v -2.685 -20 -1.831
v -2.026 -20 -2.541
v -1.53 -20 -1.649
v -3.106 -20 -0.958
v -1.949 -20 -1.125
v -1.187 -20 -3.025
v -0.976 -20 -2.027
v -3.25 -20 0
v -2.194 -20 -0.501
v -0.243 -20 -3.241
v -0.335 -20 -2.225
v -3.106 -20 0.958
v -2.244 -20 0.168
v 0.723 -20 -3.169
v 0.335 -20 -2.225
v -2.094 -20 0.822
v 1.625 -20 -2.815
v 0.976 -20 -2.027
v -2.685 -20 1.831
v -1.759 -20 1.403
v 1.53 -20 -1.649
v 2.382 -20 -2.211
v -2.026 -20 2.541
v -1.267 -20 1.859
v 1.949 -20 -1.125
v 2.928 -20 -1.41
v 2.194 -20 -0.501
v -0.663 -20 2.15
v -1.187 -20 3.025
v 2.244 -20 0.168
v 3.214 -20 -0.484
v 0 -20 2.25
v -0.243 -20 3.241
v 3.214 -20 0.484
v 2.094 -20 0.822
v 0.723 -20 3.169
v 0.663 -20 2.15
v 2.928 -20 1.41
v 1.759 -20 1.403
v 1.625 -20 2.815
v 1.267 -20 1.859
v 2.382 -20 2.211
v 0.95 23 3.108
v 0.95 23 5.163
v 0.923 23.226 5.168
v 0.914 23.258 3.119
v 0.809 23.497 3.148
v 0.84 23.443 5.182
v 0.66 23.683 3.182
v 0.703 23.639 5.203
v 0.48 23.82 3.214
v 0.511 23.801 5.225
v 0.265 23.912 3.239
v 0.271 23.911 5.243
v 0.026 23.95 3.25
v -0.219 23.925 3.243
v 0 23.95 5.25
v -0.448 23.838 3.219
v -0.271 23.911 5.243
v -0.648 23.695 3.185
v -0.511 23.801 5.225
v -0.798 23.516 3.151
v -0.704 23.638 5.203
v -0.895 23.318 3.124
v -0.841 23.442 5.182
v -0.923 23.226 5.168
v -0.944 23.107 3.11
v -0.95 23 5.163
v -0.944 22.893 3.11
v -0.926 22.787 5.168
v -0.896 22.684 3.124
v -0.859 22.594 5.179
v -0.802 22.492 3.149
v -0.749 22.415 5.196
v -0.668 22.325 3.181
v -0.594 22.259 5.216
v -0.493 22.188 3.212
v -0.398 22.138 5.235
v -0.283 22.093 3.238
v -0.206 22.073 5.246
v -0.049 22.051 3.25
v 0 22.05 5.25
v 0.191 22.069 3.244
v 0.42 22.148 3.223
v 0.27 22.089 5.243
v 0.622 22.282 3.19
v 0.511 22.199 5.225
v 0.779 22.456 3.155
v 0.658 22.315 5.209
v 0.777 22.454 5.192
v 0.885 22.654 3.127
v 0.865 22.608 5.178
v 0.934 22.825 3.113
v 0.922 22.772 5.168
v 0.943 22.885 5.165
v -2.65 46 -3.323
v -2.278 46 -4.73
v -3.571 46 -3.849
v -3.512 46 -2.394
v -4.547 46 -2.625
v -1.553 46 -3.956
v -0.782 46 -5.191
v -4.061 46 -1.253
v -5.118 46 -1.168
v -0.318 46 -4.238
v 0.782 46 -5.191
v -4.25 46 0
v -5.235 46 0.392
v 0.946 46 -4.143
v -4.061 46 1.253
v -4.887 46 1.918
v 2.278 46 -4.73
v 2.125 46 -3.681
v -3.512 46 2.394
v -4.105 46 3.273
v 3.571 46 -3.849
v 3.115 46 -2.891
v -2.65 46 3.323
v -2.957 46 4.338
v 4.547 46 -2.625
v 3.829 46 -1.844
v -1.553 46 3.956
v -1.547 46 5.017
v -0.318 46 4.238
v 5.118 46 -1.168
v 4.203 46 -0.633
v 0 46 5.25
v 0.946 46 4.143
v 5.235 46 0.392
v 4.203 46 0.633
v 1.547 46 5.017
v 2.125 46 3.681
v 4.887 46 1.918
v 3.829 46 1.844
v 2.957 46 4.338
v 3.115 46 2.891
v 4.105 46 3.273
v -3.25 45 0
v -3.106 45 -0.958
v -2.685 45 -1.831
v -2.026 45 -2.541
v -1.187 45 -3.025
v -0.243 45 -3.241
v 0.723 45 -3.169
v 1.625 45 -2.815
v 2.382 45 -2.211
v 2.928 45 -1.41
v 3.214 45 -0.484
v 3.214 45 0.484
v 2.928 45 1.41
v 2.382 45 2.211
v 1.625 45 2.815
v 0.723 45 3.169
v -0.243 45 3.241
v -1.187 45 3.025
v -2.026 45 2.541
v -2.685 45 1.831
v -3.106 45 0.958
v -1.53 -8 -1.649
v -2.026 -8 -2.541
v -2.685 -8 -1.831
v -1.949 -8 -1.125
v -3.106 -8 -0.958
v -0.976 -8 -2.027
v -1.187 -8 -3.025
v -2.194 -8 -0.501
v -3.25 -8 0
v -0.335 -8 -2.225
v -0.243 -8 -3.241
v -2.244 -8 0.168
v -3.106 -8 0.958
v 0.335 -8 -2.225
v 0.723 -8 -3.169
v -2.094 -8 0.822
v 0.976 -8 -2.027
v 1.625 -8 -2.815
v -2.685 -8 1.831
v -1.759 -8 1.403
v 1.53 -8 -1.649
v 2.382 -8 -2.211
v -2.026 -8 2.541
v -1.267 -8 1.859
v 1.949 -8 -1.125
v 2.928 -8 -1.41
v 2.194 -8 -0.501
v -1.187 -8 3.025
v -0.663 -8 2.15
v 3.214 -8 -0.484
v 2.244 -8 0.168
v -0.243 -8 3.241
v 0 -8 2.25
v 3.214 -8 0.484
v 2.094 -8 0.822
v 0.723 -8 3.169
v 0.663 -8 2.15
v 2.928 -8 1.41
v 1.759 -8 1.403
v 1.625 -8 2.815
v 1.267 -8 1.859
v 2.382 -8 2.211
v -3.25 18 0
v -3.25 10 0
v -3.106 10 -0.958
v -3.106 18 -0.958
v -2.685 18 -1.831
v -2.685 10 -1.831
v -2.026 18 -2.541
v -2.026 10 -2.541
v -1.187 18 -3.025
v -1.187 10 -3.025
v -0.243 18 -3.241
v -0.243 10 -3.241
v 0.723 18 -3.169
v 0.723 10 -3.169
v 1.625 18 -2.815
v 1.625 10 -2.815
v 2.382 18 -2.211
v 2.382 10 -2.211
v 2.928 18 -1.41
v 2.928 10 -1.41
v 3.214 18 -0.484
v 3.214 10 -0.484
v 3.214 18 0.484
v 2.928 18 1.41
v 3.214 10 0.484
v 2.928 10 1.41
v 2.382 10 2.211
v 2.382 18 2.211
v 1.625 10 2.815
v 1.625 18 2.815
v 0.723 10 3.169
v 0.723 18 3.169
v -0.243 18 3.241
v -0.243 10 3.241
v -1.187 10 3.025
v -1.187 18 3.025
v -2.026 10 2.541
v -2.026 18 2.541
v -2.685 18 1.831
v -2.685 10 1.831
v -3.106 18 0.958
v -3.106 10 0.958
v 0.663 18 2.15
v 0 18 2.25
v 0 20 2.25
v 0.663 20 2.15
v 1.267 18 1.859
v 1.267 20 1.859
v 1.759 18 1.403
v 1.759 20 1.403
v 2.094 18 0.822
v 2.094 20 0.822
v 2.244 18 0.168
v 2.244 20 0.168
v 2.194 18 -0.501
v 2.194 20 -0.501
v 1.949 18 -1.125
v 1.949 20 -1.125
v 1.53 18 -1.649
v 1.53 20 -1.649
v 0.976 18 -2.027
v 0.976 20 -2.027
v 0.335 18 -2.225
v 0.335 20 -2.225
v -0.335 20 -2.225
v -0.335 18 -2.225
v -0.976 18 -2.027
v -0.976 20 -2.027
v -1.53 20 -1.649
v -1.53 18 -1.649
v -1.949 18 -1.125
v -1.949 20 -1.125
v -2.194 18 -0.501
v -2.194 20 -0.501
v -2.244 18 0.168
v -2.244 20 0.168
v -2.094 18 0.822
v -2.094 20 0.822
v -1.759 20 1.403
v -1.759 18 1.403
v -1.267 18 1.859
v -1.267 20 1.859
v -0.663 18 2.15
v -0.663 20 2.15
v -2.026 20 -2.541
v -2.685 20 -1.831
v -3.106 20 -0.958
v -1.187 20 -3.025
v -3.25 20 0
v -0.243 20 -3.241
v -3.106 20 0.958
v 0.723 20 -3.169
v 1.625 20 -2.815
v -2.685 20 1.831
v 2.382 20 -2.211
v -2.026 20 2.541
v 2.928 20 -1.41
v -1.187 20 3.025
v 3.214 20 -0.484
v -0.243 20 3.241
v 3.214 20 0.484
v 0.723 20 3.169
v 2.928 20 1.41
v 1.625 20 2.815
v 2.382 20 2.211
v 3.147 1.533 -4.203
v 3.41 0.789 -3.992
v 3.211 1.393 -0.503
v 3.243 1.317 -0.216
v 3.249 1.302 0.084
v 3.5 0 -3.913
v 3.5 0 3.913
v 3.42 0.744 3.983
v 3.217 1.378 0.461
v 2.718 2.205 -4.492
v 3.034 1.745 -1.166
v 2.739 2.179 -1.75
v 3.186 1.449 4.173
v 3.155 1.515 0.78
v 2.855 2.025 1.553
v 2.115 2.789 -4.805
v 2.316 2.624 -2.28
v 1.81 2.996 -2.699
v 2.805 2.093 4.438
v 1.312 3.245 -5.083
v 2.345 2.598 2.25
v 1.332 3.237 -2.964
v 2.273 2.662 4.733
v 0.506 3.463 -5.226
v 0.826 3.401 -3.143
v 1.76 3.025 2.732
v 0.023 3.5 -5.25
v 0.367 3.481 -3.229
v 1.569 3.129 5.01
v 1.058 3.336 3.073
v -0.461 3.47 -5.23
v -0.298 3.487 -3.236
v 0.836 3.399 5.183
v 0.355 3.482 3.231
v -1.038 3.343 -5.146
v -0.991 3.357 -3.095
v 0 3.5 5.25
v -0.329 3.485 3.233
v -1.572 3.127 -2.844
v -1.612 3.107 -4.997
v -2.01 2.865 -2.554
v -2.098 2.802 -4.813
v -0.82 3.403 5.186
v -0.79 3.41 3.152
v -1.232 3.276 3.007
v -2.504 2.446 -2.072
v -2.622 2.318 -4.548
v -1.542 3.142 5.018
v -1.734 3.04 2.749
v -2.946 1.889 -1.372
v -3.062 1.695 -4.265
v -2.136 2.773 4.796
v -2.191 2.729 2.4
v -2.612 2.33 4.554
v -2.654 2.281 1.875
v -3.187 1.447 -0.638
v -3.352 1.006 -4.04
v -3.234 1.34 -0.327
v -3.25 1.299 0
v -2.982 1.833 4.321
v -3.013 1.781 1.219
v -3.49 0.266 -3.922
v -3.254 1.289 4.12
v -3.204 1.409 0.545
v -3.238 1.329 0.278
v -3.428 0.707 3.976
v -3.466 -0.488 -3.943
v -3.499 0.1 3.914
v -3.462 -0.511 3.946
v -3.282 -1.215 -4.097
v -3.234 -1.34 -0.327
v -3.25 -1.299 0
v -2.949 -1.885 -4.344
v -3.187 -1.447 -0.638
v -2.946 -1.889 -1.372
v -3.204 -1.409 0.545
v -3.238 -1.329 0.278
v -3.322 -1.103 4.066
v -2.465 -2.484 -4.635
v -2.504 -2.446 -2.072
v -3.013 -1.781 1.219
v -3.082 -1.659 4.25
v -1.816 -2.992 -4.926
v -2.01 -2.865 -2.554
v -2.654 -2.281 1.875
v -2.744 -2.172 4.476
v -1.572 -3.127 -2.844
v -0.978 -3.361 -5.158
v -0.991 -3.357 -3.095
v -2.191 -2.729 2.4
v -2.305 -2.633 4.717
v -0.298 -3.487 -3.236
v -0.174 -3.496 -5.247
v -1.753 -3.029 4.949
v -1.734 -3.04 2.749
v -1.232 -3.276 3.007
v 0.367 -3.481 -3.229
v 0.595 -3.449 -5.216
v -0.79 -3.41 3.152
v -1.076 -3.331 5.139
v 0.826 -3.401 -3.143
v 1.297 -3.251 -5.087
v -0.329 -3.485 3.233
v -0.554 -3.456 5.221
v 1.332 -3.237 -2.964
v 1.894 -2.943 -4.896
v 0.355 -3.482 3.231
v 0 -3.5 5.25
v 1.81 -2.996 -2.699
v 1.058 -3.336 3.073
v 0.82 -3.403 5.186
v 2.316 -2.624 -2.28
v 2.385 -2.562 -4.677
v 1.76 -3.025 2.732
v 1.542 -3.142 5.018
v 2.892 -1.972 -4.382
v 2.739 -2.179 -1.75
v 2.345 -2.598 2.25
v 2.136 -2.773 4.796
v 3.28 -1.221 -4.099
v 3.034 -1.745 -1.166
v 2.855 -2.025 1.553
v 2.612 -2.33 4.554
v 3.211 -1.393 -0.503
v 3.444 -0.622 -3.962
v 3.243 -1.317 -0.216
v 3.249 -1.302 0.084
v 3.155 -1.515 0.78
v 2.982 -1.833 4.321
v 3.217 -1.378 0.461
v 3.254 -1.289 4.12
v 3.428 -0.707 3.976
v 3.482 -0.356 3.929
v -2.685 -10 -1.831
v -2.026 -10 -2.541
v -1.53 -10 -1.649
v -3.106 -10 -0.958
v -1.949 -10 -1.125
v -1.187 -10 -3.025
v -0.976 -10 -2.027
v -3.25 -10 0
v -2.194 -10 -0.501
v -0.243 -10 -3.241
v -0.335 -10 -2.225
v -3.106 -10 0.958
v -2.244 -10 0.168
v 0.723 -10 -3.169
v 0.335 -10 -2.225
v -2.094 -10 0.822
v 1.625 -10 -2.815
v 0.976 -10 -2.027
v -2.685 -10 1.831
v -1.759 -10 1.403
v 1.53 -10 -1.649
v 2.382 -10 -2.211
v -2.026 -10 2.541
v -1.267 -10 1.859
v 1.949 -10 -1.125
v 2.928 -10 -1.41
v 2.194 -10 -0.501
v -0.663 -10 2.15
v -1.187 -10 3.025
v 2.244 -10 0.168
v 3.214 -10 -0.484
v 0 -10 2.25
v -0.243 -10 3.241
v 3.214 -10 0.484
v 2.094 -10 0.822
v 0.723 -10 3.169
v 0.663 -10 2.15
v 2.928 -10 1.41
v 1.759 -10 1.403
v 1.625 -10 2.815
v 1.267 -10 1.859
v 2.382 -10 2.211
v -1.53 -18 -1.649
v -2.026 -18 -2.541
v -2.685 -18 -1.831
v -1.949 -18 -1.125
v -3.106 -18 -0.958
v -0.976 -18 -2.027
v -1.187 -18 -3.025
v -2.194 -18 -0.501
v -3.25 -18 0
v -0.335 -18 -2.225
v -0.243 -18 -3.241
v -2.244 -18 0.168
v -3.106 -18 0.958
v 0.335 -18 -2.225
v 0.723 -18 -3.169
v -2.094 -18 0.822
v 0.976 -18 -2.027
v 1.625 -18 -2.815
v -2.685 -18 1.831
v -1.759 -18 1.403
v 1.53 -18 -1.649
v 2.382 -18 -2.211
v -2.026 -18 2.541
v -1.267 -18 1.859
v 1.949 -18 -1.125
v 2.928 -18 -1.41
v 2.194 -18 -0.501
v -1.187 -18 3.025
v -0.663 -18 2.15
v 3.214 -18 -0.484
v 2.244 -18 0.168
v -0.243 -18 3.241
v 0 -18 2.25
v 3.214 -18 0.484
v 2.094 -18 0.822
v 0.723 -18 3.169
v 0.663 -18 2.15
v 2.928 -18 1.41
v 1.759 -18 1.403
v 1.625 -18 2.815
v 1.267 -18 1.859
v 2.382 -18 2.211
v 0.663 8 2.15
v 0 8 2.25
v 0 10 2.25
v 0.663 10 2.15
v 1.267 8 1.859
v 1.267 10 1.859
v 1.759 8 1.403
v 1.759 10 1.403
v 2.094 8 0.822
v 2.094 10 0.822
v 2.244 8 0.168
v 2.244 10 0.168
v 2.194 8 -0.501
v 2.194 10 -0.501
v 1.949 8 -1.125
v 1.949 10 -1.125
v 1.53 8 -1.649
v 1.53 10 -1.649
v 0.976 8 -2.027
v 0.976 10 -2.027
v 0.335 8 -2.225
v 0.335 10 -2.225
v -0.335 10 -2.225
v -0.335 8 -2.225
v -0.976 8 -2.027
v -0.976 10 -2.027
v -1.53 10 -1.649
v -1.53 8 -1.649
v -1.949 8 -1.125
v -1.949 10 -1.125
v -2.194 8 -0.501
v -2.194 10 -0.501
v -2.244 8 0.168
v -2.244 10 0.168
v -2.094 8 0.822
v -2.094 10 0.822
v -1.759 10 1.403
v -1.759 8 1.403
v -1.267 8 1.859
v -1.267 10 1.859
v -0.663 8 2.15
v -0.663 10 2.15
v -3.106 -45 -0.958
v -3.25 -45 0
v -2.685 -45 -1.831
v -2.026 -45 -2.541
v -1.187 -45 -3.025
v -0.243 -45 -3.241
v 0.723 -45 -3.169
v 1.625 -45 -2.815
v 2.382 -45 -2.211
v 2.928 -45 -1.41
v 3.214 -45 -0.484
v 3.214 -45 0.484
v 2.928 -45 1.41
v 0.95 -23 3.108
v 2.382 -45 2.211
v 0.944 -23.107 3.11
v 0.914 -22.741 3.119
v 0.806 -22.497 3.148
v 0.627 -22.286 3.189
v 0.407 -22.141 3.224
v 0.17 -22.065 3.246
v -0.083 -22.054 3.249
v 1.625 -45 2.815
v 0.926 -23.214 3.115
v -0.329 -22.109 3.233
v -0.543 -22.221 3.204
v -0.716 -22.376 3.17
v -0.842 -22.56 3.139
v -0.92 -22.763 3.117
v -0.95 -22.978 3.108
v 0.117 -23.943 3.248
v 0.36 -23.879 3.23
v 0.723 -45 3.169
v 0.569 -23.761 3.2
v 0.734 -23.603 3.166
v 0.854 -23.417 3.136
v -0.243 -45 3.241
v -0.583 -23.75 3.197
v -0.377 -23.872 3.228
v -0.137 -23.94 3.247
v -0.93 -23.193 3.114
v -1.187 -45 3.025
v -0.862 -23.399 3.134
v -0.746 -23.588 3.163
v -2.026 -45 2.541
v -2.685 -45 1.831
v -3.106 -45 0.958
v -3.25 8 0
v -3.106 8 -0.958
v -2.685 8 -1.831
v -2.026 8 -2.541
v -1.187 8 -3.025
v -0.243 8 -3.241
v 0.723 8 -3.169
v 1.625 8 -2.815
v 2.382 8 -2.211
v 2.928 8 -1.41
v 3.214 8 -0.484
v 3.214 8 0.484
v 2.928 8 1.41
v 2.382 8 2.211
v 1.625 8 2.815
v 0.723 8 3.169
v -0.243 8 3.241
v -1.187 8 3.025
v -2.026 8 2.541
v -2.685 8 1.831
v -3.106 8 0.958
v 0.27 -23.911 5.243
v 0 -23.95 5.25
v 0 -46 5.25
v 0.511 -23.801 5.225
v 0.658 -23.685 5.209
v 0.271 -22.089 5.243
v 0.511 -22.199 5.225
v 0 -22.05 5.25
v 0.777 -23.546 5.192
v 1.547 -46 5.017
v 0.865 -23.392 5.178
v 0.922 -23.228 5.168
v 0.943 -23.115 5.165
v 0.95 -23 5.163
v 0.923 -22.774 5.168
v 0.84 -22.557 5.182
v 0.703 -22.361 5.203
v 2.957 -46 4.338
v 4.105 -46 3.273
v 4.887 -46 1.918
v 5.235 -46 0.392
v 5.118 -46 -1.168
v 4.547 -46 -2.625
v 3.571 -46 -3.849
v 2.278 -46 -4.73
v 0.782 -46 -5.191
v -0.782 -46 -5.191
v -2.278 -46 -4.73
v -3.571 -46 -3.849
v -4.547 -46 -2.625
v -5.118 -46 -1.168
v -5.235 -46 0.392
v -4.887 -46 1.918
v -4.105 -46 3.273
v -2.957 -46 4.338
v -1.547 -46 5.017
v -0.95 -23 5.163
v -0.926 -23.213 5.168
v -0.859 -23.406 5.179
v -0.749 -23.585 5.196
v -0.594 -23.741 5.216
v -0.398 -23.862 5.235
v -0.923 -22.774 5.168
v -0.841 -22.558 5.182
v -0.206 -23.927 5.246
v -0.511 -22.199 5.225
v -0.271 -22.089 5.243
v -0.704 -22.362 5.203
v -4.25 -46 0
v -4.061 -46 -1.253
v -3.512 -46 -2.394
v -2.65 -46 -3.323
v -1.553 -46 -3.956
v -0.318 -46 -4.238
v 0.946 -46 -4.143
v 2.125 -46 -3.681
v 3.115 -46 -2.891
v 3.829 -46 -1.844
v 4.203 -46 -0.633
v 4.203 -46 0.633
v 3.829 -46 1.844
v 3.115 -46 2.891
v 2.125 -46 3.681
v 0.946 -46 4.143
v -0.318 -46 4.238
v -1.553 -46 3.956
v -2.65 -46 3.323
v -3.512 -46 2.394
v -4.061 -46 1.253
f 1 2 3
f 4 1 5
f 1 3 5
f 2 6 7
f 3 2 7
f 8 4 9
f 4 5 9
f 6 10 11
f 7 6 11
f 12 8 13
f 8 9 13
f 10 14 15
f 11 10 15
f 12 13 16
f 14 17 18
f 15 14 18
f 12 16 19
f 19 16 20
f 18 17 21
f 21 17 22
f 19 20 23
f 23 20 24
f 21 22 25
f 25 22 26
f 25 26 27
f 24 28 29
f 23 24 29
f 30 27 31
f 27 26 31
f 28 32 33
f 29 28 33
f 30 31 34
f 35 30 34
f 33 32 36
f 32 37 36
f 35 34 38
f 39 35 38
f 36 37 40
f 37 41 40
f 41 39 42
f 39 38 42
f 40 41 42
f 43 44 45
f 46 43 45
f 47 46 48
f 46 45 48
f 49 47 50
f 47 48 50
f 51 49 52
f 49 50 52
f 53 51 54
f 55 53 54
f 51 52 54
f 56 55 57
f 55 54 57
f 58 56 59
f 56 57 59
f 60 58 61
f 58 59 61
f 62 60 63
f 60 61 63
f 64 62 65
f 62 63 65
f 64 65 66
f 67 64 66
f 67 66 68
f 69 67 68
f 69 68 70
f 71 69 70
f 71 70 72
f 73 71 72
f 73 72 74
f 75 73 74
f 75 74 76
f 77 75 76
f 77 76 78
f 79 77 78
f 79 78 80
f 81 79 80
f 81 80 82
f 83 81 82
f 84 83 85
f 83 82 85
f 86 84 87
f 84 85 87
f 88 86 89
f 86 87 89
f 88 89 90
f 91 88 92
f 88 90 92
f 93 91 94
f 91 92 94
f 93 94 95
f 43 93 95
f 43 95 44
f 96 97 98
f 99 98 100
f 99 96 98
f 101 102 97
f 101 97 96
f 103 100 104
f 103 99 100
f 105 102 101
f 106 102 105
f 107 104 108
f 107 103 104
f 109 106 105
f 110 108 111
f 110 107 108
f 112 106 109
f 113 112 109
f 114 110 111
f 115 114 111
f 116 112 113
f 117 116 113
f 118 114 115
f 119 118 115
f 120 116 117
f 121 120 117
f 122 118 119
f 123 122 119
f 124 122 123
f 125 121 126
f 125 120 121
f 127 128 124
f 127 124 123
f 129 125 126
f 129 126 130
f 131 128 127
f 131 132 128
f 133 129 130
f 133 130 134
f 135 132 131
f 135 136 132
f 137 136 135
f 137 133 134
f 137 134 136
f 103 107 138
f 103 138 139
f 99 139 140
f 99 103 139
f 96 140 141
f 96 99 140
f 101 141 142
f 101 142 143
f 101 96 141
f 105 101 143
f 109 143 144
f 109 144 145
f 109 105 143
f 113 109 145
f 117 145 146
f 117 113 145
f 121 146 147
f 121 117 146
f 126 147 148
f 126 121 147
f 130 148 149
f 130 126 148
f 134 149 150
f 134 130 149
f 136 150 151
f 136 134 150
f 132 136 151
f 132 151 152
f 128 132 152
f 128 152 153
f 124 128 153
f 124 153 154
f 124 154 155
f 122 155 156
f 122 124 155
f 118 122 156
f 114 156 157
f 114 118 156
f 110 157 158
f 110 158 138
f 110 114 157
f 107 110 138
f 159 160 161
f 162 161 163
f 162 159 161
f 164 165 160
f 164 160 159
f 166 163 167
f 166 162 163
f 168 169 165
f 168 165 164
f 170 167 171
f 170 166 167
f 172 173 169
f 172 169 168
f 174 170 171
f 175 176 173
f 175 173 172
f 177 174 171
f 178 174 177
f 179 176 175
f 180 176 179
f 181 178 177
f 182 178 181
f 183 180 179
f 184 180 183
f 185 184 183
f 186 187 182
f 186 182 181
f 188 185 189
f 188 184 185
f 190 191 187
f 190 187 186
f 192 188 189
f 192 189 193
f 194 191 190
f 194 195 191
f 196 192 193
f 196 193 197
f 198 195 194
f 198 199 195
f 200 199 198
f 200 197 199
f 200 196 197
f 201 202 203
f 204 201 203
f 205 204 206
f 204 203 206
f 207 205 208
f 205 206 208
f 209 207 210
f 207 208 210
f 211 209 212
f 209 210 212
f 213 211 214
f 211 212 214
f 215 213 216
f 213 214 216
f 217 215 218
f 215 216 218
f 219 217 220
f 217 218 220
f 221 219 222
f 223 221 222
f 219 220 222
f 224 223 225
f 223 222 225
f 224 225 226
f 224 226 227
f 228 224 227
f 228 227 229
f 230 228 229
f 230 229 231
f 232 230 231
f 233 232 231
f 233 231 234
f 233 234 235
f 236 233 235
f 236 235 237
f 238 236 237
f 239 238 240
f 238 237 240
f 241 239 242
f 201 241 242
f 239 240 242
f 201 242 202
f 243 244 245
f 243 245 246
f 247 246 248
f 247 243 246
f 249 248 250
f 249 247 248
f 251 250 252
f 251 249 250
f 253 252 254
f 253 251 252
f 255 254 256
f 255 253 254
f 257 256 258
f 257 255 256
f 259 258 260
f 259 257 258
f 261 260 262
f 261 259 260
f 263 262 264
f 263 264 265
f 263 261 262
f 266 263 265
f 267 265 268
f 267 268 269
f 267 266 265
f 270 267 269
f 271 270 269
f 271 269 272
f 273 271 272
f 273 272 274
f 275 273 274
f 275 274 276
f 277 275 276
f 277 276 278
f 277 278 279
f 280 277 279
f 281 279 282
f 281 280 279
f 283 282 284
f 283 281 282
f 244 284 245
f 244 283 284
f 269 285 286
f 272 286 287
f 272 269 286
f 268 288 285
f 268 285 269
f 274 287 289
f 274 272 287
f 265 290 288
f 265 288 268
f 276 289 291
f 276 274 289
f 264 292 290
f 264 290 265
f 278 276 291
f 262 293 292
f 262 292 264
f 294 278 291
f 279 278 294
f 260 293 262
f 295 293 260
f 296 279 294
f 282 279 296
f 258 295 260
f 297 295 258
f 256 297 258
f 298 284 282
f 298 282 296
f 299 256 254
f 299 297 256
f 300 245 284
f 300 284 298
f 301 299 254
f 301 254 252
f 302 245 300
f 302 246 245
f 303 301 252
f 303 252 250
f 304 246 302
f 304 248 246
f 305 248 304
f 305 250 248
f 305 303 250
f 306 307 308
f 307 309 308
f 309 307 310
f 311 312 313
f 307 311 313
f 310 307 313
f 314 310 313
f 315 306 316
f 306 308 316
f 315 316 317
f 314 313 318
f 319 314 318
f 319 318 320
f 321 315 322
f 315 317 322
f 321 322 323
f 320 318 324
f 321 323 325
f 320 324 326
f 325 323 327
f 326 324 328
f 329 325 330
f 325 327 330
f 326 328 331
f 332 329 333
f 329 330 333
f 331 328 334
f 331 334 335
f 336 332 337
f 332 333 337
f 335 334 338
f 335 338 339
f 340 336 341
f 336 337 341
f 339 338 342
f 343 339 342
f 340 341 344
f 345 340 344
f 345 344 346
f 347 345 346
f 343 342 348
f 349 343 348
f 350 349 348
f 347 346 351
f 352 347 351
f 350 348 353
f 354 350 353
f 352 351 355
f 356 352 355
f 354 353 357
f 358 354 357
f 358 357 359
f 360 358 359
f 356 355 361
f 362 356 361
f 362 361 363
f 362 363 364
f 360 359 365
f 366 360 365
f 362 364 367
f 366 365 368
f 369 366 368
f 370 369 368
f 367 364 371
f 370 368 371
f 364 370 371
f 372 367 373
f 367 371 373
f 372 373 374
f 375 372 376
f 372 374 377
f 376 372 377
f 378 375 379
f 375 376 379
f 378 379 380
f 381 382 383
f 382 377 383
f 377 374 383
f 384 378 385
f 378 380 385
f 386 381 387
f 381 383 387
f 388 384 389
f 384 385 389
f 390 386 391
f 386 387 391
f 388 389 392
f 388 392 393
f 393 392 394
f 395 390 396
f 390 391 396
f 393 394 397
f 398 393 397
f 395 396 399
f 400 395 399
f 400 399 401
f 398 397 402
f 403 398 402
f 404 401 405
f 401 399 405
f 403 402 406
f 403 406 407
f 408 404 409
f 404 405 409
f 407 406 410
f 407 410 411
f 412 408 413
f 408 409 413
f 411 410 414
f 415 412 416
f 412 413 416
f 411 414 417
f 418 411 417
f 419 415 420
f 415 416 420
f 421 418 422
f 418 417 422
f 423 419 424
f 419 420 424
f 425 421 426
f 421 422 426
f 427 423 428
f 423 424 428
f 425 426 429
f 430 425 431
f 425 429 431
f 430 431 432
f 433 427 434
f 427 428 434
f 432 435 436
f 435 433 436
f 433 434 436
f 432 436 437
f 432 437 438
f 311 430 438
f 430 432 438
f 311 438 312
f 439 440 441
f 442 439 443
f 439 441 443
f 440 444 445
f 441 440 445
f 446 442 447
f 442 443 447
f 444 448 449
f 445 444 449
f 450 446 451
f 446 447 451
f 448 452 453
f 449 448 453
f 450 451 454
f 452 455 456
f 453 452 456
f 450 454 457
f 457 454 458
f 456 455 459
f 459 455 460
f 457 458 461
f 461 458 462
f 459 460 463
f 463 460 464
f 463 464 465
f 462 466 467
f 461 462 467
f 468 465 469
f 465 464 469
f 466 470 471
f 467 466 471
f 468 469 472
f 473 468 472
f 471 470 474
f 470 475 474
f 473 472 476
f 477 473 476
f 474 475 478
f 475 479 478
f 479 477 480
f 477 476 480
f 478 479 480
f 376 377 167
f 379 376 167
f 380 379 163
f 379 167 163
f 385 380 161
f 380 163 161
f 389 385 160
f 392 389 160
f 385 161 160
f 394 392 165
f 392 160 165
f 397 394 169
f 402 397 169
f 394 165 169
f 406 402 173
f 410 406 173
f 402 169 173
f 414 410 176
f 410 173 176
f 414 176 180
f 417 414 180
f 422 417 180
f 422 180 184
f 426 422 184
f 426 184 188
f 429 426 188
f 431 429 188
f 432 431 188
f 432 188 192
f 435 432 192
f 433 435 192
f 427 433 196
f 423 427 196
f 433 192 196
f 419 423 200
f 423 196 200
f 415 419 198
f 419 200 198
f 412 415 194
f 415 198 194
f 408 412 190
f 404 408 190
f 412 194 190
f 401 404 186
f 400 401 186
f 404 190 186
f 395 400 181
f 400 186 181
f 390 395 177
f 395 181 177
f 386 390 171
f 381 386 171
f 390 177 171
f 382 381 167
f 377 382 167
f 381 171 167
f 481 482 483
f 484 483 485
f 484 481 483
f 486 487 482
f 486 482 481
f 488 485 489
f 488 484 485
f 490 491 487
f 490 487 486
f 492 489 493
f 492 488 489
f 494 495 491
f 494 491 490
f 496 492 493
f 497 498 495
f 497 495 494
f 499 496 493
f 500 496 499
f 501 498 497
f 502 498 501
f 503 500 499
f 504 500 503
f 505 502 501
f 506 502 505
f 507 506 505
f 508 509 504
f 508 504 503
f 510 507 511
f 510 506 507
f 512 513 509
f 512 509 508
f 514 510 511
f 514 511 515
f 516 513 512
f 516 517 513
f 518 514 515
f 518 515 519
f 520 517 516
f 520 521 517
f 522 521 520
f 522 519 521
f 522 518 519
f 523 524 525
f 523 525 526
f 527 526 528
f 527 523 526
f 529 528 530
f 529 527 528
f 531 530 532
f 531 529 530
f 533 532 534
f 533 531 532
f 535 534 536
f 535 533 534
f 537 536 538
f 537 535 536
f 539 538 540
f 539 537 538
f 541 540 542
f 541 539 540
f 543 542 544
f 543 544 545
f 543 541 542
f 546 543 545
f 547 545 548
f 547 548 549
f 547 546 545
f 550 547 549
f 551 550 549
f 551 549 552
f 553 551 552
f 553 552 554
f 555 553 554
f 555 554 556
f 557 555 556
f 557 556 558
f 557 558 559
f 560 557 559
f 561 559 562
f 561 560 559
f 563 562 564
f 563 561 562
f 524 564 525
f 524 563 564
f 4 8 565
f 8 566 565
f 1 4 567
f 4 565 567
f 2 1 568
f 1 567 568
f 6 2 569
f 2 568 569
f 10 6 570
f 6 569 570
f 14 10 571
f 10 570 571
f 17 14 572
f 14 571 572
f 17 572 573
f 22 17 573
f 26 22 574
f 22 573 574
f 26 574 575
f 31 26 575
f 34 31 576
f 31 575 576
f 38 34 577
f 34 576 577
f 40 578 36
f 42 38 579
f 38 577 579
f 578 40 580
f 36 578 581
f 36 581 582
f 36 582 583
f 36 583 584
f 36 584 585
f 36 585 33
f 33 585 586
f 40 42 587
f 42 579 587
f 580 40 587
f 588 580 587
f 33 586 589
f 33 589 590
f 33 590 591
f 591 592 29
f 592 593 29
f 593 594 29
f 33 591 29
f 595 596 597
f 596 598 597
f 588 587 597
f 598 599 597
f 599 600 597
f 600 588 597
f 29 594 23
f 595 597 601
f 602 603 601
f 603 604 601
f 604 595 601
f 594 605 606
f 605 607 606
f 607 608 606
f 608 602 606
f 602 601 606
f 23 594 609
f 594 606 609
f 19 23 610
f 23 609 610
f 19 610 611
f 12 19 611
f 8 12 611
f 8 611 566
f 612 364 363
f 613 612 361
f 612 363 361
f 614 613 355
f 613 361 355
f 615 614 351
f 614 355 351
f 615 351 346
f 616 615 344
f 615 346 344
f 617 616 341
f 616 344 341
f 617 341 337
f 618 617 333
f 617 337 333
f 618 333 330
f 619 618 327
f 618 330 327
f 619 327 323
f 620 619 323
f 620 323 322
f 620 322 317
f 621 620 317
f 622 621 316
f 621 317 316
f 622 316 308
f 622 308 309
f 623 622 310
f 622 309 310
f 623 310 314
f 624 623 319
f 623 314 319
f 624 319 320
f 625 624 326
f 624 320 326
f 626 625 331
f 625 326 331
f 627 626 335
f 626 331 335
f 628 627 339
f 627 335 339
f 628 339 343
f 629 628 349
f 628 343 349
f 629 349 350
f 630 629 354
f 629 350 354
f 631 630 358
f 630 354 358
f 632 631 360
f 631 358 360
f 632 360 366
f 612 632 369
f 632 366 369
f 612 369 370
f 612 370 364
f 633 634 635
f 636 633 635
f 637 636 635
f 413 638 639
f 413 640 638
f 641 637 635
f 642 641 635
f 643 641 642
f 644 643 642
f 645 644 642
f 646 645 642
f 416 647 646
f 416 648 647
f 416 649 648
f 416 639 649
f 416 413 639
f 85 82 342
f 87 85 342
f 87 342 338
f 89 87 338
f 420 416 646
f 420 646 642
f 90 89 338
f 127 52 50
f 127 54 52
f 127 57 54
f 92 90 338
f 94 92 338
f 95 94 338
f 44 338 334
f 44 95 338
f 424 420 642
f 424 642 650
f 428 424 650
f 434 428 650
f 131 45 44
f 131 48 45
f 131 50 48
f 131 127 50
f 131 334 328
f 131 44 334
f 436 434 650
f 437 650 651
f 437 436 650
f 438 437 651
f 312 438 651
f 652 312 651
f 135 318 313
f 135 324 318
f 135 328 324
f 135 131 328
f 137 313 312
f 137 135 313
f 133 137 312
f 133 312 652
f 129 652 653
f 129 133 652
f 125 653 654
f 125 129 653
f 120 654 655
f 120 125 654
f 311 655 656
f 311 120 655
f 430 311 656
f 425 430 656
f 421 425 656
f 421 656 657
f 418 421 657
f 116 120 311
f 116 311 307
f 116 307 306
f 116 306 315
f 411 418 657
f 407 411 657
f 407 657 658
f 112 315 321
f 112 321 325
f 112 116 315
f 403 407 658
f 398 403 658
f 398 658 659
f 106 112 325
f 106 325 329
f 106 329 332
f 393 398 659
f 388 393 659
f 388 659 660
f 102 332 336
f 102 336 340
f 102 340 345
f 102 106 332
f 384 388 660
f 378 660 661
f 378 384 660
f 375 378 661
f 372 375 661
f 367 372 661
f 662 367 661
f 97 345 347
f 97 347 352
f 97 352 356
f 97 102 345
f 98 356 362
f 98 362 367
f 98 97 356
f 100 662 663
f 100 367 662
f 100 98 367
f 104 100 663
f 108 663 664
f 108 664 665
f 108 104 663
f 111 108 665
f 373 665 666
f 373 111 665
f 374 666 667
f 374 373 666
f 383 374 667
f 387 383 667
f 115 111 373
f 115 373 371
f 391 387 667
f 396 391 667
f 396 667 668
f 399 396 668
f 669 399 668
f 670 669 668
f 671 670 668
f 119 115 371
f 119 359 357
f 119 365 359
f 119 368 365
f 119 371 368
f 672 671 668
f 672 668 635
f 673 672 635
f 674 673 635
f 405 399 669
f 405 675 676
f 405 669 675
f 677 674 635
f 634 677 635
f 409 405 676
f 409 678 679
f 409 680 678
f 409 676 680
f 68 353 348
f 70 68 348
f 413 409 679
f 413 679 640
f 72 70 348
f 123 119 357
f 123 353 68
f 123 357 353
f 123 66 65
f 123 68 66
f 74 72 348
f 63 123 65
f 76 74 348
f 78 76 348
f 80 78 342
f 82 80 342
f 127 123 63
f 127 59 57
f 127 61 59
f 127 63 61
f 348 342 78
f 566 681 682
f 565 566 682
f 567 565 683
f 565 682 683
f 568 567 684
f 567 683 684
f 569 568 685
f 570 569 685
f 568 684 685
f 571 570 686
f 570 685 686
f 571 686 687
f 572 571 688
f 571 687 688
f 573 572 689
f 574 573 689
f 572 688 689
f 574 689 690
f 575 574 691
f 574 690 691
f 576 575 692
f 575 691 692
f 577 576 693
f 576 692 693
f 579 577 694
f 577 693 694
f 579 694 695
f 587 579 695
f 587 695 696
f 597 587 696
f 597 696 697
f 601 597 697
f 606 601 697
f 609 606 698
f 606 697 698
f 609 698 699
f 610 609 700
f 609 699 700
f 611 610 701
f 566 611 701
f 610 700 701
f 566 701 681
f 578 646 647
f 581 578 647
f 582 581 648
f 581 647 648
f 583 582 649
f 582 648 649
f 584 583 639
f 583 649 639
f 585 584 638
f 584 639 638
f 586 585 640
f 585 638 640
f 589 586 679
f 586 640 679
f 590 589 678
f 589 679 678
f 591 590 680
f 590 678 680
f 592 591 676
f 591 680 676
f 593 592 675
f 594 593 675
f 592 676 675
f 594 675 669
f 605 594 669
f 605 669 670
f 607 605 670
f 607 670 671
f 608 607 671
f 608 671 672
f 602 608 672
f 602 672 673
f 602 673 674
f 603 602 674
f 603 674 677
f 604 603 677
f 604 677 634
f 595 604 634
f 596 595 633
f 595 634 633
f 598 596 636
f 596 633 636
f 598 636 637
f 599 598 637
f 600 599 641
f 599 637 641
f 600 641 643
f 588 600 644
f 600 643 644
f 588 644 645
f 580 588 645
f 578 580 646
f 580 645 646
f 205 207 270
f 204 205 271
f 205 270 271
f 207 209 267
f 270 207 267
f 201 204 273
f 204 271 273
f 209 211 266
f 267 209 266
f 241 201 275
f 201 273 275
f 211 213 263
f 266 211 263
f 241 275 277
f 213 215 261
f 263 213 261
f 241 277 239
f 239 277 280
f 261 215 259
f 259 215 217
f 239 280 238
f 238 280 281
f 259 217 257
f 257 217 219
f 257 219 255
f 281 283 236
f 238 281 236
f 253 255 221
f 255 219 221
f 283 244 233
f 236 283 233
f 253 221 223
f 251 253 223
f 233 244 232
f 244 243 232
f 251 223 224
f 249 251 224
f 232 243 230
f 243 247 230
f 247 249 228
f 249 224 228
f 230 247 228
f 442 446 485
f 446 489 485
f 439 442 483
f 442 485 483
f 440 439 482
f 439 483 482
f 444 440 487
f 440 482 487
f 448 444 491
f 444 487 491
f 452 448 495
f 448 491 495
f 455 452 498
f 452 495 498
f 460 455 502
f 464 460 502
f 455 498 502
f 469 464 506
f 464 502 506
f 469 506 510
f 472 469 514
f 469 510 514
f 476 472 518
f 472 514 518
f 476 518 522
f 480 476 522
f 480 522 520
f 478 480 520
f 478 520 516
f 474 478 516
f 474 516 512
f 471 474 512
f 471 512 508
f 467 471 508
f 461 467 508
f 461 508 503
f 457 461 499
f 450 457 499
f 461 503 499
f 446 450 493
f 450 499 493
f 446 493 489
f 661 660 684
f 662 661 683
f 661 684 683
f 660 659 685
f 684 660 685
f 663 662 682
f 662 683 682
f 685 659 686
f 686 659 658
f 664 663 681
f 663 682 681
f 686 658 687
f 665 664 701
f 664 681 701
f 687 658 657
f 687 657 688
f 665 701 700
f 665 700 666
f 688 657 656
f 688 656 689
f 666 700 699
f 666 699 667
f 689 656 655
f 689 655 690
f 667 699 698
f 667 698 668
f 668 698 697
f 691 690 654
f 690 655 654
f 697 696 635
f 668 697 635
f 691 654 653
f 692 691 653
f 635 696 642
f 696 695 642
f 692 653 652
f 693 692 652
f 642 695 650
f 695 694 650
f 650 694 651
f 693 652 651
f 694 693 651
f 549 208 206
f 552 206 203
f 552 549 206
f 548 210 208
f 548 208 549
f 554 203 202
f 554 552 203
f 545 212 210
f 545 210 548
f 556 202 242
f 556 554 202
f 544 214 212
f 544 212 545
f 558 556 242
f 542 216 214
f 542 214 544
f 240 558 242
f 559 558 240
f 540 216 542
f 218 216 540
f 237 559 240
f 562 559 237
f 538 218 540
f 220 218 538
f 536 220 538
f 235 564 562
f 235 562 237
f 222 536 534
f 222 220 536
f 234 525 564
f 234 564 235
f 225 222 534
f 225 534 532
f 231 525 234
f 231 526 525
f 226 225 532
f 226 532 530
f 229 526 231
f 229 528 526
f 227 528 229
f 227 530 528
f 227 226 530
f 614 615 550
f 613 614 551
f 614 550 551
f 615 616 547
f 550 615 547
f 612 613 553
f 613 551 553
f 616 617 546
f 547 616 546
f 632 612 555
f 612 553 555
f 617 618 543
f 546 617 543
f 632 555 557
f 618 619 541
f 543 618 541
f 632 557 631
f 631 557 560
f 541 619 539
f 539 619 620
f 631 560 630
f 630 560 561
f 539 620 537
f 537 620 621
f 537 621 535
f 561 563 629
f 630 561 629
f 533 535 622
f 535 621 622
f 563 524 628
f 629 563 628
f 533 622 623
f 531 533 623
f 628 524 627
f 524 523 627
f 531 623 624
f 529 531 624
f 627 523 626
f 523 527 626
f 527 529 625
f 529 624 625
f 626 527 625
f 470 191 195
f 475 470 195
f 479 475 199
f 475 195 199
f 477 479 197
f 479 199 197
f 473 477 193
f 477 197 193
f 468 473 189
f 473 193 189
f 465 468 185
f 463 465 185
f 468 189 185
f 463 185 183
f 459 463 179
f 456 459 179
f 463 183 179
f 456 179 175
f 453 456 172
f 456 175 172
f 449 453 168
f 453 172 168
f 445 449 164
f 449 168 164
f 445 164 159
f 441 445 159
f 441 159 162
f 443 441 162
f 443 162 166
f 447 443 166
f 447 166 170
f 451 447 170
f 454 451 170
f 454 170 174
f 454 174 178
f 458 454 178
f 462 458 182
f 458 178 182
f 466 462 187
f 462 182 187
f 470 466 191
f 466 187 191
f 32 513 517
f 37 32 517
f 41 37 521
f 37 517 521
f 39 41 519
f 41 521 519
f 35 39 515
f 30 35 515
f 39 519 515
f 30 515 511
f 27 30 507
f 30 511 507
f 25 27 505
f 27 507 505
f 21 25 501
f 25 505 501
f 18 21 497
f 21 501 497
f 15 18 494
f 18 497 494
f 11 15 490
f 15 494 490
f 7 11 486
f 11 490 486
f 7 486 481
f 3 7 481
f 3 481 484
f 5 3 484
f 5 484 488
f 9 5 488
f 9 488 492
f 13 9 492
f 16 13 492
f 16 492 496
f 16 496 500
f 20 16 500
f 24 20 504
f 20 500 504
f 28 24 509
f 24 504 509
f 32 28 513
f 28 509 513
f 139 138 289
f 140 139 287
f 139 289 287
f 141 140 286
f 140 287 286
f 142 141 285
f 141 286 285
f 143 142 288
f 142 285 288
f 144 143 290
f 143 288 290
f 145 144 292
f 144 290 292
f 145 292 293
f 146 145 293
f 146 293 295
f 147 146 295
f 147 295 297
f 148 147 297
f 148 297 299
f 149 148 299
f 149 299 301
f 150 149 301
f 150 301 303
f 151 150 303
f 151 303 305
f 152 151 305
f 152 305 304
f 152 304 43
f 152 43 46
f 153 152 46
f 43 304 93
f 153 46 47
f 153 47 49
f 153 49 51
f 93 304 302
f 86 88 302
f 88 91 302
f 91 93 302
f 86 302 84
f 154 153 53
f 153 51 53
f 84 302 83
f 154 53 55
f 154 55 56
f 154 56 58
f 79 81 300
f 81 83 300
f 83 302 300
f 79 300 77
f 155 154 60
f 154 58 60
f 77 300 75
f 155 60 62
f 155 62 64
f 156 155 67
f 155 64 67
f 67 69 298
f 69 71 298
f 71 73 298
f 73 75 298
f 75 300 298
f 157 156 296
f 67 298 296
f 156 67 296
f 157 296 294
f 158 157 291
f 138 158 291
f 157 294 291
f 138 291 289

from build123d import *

# Parameters (mm, degrees)
SKETCH1_W                  = 5.25
SKETCH1_H                  = 92
HOLEWZD1_D                 = 7
F_6_5_6_5_DIAMETER_HOLE0_D = 6.5
HOLEWZD3_D                 = 1.9
HOLEWZD3_DEPTH             = 2.141945946
BOSS_EXTRUDE1_START        = -2
SKETCH7_R                  = 3.25
SKETCH7_R_2                = 2.25
BOSS_EXTRUDE1_DEPTH        = 2
BOSS_EXTRUDE2_START        = -2
SKETCH8_R                  = 3.25
SKETCH8_R_2                = 2.25
BOSS_EXTRUDE2_DEPTH        = 2
CHAMFER2_SIZE              = 1


with BuildPart() as part:
    # Sketch1 → Revolve1 (revolve)
    with BuildSketch(Plane(origin=(0, 0, 1.653301878), x_dir=(-1, 0, 0), z_dir=(0, 0, -1)), mode=Mode.PRIVATE) as revolve1_sk:
        with Locations((-2.625, 15.152992085)):
            Rectangle(SKETCH1_W, SKETCH1_H)
    revolve(revolve1_sk.sketch.rotate(Axis((0, -30.847007915, 1.653301878), (0, 1, 0)), 270), axis=Axis((0, -30.847007915, 1.653301878), (0, 1, 0)))

    # HoleWzd1 (through all)
    with Locations(Plane(origin=(0, 15.152992085, -3.596698122), x_dir=(-1, 0, 0), z_dir=(0, 0, -1))):
        with Locations((0, 0)):
            Hole(HOLEWZD1_D / 2)

    # Ø6.5 (6.5) Diameter Hole0 (through all)
    with Locations(Plane(origin=(0, 61.152992085, 0), x_dir=(1, 0, 0), z_dir=(0, 1, 0))):
        with Locations((0, -1.653301878)):
            Hole(F_6_5_6_5_DIAMETER_HOLE0_D / 2)

    # HoleWzd3
    with Locations(Plane(origin=(0, 0, 4.761355931), x_dir=(-1, 0, 0), z_dir=(0, 0, -1))):
        with Locations((0, 38.152992085), (0, -7.847007915)):
            Hole(HOLEWZD3_D / 2, depth=HOLEWZD3_DEPTH)

    # Sketch7 → Boss-Extrude1 (add)
    with BuildSketch(Plane(origin=(0, 35.152992085, 0), x_dir=(1, 0, 0), z_dir=(0, 1, 0)).offset(BOSS_EXTRUDE1_START)):
        with Locations(Location((0, -1.653301878, 0), (0, 0, 270))):
            Circle(SKETCH7_R)
        with Locations(Location((0, -1.653301878, 0), (0, 0, 270))):
            Circle(SKETCH7_R_2, mode=Mode.SUBTRACT)
    boss_extrude1 = extrude(amount=BOSS_EXTRUDE1_DEPTH)

    # Sketch8 → Boss-Extrude2 (add)
    with BuildSketch(Plane(origin=(0, 25.152992085, 0), x_dir=(1, 0, 0), z_dir=(0, 1, 0)).offset(BOSS_EXTRUDE2_START)):
        with Locations(Location((0, -1.653301878, 0), (0, 0, 270))):
            Circle(SKETCH8_R)
        with Locations(Location((0, -1.653301878, 0), (0, 0, 270))):
            Circle(SKETCH8_R_2, mode=Mode.SUBTRACT)
    boss_extrude2 = extrude(amount=BOSS_EXTRUDE2_DEPTH)

    # Chamfer2
    chamfer2_edges = [part.edges().sort_by_distance(p)[0] for p in [
        (3.25, -30.847007915, 1.653301878),
        (3.25, 61.152992085, 1.653301878),
    ]]
    chamfer(chamfer2_edges, length=CHAMFER2_SIZE)

    # Mirror1: Boss-Extrude1, Boss-Extrude2 across plane
    add(boss_extrude1.mirror(Plane.ZX.offset(15.152992085)))
    add(boss_extrude2.mirror(Plane.ZX.offset(15.152992085)))


with BuildPart() as part_1:
    # Move Body 1: read off the stored shape, not the designer's step
    # Move Body 1: moved
    add(part.part.moved(Location((0, -15.1529921, -1.6533019))))


solid = part_1.part
